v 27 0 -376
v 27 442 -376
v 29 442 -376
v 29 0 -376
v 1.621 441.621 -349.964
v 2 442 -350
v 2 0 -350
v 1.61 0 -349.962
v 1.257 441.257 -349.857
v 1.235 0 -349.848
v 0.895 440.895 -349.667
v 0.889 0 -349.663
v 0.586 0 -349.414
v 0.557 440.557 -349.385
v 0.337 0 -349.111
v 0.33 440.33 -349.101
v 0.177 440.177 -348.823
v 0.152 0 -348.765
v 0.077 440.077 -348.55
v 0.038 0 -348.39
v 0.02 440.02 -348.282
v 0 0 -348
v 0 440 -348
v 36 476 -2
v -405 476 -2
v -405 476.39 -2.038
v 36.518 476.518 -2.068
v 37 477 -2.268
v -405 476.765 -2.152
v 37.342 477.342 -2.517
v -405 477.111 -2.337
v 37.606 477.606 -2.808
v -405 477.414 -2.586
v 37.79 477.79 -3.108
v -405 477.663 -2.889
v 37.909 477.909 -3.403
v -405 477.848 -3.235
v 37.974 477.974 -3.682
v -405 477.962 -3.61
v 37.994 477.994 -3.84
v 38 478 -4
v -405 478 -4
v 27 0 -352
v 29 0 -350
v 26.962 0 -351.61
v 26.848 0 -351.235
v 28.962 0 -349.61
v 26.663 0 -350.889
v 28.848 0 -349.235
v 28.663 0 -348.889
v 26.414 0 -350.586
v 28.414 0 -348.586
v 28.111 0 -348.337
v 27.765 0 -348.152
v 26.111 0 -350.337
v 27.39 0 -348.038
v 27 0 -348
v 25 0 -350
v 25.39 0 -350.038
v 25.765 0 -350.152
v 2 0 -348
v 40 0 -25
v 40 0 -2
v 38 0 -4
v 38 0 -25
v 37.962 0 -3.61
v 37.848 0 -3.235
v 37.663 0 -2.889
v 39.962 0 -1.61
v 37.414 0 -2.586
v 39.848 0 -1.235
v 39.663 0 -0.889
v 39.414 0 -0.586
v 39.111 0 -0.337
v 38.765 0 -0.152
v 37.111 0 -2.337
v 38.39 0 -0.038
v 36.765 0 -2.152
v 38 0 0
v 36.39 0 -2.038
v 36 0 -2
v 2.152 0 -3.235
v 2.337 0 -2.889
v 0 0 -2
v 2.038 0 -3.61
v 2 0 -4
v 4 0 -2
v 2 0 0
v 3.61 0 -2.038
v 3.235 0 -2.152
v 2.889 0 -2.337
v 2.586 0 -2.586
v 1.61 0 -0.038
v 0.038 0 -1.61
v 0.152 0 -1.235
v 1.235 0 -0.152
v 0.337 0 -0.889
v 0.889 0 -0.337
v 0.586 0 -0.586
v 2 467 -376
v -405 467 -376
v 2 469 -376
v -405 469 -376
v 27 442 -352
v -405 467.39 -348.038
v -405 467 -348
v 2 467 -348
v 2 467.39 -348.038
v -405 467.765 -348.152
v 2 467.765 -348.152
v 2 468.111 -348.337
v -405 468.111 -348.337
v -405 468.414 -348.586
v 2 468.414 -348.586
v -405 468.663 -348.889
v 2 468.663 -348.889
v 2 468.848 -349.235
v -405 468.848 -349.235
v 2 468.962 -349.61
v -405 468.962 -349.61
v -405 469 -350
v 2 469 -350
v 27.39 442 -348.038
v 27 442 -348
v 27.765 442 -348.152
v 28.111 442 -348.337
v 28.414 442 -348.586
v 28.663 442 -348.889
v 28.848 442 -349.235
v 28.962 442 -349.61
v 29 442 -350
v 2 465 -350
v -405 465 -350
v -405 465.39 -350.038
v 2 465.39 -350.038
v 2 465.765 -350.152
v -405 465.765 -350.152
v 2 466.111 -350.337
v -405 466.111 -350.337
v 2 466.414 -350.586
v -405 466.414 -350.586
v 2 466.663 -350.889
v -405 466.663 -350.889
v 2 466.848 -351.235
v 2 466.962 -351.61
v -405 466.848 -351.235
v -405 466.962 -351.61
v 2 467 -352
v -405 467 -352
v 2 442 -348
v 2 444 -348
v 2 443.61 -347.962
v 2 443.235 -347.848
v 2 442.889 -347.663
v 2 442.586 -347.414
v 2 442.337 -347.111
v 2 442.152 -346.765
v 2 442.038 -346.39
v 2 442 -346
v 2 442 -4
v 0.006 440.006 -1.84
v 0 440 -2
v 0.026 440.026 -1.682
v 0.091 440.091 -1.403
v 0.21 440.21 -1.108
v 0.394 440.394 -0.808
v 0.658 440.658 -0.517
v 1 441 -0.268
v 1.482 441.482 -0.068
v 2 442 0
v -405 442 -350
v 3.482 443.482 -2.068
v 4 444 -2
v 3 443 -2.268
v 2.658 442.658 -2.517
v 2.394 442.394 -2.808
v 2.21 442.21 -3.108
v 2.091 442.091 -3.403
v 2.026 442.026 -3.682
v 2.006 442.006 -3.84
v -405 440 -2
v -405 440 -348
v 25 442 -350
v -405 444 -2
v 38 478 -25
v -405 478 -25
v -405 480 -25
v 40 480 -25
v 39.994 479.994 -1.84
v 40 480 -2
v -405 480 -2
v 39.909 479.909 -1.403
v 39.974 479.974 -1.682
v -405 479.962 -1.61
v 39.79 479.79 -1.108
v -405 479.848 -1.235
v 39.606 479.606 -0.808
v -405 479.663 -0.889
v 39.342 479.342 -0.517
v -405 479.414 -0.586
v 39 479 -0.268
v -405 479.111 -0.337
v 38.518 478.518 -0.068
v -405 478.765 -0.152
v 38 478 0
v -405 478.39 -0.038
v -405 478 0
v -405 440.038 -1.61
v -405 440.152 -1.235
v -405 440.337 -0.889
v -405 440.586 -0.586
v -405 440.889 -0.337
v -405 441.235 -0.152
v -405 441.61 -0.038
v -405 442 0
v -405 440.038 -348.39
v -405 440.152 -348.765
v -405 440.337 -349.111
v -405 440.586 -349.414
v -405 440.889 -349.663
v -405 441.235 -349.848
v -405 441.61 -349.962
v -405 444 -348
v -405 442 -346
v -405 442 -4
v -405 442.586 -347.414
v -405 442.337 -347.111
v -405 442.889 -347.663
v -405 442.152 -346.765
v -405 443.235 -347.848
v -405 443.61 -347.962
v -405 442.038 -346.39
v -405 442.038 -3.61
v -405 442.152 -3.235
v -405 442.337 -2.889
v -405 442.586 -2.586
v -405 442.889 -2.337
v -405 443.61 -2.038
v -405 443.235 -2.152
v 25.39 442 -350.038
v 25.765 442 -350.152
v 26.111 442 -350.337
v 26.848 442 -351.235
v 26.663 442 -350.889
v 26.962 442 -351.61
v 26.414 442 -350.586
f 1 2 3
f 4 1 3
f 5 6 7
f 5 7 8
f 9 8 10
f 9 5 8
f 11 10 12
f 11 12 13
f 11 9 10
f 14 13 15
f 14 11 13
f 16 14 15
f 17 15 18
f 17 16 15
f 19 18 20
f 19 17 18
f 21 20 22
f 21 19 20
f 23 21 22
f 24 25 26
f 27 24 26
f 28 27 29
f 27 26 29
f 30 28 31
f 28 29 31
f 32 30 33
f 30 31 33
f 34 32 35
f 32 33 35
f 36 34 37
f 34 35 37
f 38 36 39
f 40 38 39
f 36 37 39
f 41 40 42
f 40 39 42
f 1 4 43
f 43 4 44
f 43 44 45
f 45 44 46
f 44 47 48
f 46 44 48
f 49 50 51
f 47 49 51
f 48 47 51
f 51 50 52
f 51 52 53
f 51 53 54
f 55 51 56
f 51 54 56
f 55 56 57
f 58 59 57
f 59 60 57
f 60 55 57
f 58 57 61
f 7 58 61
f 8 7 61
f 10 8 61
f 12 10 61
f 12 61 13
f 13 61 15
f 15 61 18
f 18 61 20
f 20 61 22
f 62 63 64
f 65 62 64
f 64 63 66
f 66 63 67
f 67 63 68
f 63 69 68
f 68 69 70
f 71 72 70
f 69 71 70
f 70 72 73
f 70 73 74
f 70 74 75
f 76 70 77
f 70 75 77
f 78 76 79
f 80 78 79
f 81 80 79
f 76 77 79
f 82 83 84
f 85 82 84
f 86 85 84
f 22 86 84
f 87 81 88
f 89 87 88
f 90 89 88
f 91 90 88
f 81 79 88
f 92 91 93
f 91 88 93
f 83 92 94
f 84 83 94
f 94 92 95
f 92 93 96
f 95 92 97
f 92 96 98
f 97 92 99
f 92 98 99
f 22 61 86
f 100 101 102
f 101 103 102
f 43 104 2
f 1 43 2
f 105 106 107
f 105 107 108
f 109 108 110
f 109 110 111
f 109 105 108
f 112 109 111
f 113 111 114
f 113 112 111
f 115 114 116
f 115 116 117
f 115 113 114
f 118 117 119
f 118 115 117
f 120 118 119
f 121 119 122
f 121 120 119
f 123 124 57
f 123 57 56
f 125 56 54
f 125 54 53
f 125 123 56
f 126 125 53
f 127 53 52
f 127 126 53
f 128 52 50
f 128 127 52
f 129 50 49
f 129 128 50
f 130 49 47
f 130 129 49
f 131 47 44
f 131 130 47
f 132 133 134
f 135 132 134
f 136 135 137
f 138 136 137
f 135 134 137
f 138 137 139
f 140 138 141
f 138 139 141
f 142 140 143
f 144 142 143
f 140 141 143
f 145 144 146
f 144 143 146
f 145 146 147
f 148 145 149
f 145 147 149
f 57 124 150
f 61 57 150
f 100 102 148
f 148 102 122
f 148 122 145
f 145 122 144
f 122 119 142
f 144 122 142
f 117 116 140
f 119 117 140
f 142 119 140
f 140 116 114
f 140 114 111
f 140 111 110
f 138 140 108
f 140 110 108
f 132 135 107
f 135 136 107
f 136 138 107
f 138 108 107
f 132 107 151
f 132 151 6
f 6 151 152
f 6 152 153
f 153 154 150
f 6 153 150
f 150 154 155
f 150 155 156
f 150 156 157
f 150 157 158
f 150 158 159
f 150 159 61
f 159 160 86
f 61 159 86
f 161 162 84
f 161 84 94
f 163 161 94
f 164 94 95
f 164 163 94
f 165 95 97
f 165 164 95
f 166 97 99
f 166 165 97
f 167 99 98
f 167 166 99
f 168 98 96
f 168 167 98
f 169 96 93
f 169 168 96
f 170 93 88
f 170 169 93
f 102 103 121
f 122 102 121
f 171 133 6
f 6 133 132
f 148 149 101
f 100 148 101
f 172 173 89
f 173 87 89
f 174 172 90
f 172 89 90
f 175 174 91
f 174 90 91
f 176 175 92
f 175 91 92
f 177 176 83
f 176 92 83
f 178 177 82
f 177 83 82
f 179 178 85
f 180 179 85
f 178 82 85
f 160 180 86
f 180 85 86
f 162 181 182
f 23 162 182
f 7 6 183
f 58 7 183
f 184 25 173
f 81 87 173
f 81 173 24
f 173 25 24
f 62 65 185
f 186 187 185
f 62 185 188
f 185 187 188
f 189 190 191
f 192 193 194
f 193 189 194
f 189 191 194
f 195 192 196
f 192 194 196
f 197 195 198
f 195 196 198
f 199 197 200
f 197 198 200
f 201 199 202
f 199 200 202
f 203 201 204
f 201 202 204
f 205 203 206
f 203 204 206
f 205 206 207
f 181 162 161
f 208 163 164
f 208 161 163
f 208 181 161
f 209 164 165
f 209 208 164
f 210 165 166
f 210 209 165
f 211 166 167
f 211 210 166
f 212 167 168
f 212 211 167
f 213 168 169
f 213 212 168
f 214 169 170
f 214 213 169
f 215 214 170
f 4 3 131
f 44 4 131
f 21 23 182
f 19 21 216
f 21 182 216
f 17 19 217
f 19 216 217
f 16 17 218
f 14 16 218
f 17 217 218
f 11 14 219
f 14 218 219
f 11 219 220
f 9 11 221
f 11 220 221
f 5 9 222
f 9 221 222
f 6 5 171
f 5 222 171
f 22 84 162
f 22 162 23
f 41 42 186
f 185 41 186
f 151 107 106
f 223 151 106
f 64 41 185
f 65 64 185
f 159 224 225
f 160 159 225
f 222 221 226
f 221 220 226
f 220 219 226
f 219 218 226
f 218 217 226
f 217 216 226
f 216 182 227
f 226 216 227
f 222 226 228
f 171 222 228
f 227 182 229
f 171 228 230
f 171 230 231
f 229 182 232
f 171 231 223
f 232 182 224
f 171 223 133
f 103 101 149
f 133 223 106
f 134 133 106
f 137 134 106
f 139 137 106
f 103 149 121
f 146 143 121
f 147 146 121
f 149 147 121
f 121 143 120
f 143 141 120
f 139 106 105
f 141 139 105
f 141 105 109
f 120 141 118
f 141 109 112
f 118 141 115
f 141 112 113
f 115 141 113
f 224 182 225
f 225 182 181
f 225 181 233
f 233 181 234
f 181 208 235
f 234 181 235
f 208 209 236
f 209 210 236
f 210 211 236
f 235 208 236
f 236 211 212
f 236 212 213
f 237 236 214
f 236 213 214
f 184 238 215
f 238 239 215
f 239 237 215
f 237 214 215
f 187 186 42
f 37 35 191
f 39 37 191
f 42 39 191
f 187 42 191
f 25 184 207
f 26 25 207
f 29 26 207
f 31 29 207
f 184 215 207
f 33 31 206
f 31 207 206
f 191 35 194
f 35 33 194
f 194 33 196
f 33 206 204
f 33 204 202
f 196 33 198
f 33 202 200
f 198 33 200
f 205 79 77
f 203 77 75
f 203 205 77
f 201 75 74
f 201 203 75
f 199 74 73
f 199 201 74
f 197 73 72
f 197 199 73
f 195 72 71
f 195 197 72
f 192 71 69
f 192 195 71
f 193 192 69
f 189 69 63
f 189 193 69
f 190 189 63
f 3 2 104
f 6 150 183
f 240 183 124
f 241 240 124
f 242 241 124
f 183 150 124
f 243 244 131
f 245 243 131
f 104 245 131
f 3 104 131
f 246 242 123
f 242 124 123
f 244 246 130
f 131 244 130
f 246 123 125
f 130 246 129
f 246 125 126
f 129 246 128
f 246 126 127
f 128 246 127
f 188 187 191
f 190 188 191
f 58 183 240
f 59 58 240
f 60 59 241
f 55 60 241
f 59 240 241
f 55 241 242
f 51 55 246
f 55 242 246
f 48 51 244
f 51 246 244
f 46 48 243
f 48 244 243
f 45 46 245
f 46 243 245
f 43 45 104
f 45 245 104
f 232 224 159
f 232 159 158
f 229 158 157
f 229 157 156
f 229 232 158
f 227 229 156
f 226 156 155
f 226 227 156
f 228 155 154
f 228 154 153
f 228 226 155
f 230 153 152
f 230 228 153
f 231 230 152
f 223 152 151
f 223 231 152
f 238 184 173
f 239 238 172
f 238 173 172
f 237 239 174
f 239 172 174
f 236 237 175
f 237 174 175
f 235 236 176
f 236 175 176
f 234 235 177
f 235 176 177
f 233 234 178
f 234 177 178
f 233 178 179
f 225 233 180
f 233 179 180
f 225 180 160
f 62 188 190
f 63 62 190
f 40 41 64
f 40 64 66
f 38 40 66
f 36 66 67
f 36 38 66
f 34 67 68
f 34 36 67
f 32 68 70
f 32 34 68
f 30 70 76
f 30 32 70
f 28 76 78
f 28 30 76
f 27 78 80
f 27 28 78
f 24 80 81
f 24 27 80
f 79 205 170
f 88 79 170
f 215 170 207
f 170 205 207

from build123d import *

# Parameters (mm, degrees)
F3_W         = 27
F3_H         = 27
F4_DEPTH     = 30
F5_T1_DEPTH  = 407
F5_T3_DEPTH  = 443
F5_T5_DEPTH  = 442
F5_T7_DEPTH  = 478
F5_T13_DEPTH = 447
F5_T17_DEPTH = 412
F5_T20_DEPTH = 417
F5_T22_DEPTH = 455
F5_T24_DEPTH = 410
F5_T26_DEPTH = 445
F5_T28_DEPTH = 490
F5_T30_DEPTH = 452
F5_T36_DEPTH = 415
F5_T40_DEPTH = 450
F5_T47_DEPTH = 415
F5_T51_DEPTH = 450


# Not quite as in the source:
# - a fillet or chamfer that OpenCascade refuses, or shapes differently, is made with other operations: its cross-section is extruded or revolved along the edge and cut away or added


with BuildPart() as f2:
    # F2: sweep along a path in F1
    with BuildLine(Plane.XY) as f2_path:
        Line((0, 0), (0, 440))
        Line((0, 440), (-405, 440))
    # F0 (on Front) → F2 (sweep)
    with BuildSketch(Plane.XZ):
        Polygon((38, -2), (38, -25), (40, -25), (40, 0), (0, 0), (0, -350), (27, -350), (27, -376), (29, -376), (29, -348), (2, -348), (2, -2), align=None)
    sweep(path=f2_path.line, transition=Transition.RIGHT)

    # F3 (on face) → F4 (cut)
    with BuildSketch(Plane.XY.offset(-348)):
        with Locations((15.5, 455.5)):
            Rectangle(F3_W, F3_H)
    extrude(amount=-F4_DEPTH, mode=Mode.SUBTRACT)

    # F5: fillet of radius 2 on 15 edges, made by hand

    # F5_s2 → F5_t1 (join)
    with BuildSketch(Plane.YZ.offset(-405)):
        with BuildLine():
            ThreePointArc((442, -346), (442.5857864376, -347.4142135624), (444, -348))
            Line((444, -348), (442, -348))
            Line((442, -348), (442, -346))
        make_face()
        with BuildLine():
            ThreePointArc((465, -350), (466.4142135624, -350.5857864376), (467, -352))
            Line((467, -352), (467, -350))
            Line((467, -350), (465, -350))
        make_face()
        with BuildLine():
            ThreePointArc((444, -2), (442.5857864376, -2.5857864376), (442, -4))
            Line((442, -4), (442, -2))
            Line((442, -2), (444, -2))
        make_face()
    extrude(amount=F5_T1_DEPTH)

    # F5_s4 → F5_t3 (join)
    with BuildSketch(Plane.YZ.offset(-405)):
        with BuildLine():
            ThreePointArc((476, -2), (477.4142135624, -2.5857864376), (478, -4))
            Line((478, -4), (478, -2))
            Line((478, -2), (476, -2))
        make_face()
    extrude(amount=F5_T3_DEPTH)

    # F5_s6 → F5_t5 (join)
    with BuildSketch(Plane.XZ.offset(-442)):
        with BuildLine():
            ThreePointArc((25, -350), (26.4142135624, -350.5857864376), (27, -352))
            Line((27, -352), (27, -350))
            Line((27, -350), (25, -350))
        make_face()
        with BuildLine():
            ThreePointArc((4, -2), (2.5857864376, -2.5857864376), (2, -4))
            Line((2, -4), (2, -2))
            Line((2, -2), (4, -2))
        make_face()
    extrude(amount=F5_T5_DEPTH)

    # F5_s8 → F5_t7 (join)
    with BuildSketch(Plane.XZ.offset(-478)):
        with BuildLine():
            ThreePointArc((38, -4), (37.4142135624, -2.5857864376), (36, -2))
            Line((36, -2), (38, -2))
            Line((38, -2), (38, -4))
        make_face()
    extrude(amount=F5_T7_DEPTH)


with BuildPart() as f5_tool11:
    # F5_s12 → F5_t13 (new body)
    with BuildSketch(Plane.XZ):
        with BuildLine():
            ThreePointArc((4, -2), (2.5857864376, -2.5857864376), (2, -4))
            Line((2, -4), (2, -2))
            Line((2, -2), (4, -2))
        make_face()
    extrude(amount=-F5_T13_DEPTH)

    split(bisect_by=Plane.XZ.offset(-442), keep=Keep.BOTTOM)


with BuildPart() as f5_tool15:
    # F5_s16 → F5_t17 (new body)
    with BuildSketch(Plane.YZ.offset(7)):
        with BuildLine():
            ThreePointArc((444, -2), (442.5857864376, -2.5857864376), (442, -4))
            Line((442, -4), (442, -2))
            Line((442, -2), (444, -2))
        make_face()
    extrude(amount=-F5_T17_DEPTH)

    split(bisect_by=Plane.YZ.offset(2), keep=Keep.TOP)


with BuildPart() as f5_tool11_1:
    add(f5_tool11.part)

    # F5_t19: intersect F5_tool15
    add(f5_tool15.part, mode=Mode.INTERSECT)


with BuildPart() as f2_1:
    add(f2.part)

    # F5_t9: union F5_tool11
    add(f5_tool11_1.part)

    # F5_s21 → F5_t20 (cut)
    with BuildSketch(Plane.YZ.offset(-410)):
        with BuildLine():
            ThreePointArc((467, -348), (468.4142135624, -348.5857864376), (469, -350))
            Line((469, -350), (469, -348))
            Line((469, -348), (467, -348))
        make_face()
    extrude(amount=F5_T20_DEPTH, mode=Mode.SUBTRACT)

    # F5_s23 → F5_t22 (cut)
    with BuildSketch(Plane.YZ.offset(-410)):
        with BuildLine():
            ThreePointArc((480, -2), (479.4142135624, -0.5857864376), (478, 0))
            Line((478, 0), (480, 0))
            Line((480, 0), (480, -2))
        make_face()
    extrude(amount=F5_T22_DEPTH, mode=Mode.SUBTRACT)

    # F5_s25 → F5_t24 (cut)
    with BuildSketch(Plane.YZ.offset(-410)):
        with BuildLine():
            ThreePointArc((440, -2), (440.5857864376, -0.5857864376), (442, 0))
            Line((442, 0), (440, 0))
            Line((440, 0), (440, -2))
        make_face()
        with BuildLine():
            ThreePointArc((440, -348), (440.5857864376, -349.4142135624), (442, -350))
            Line((442, -350), (440, -350))
            Line((440, -350), (440, -348))
        make_face()
    extrude(amount=F5_T24_DEPTH, mode=Mode.SUBTRACT)

    # F5_s27 → F5_t26 (cut)
    with BuildSketch(Plane.XZ.offset(-440)):
        with BuildLine():
            ThreePointArc((0, -2), (0.5857864376, -0.5857864376), (2, 0))
            Line((2, 0), (0, 0))
            Line((0, 0), (0, -2))
        make_face()
        with BuildLine():
            ThreePointArc((2, -350), (0.5857864376, -349.4142135624), (0, -348))
            Line((0, -348), (0, -350))
            Line((0, -350), (2, -350))
        make_face()
    extrude(amount=F5_T26_DEPTH, mode=Mode.SUBTRACT)

    # F5_s29 → F5_t28 (cut)
    with BuildSketch(Plane.XZ.offset(-485)):
        with BuildLine():
            ThreePointArc((38, 0), (39.4142135624, -0.5857864376), (40, -2))
            Line((40, -2), (40, 0))
            Line((40, 0), (38, 0))
        make_face()
    extrude(amount=F5_T28_DEPTH, mode=Mode.SUBTRACT)

    # F5_s31 → F5_t30 (cut)
    with BuildSketch(Plane.XZ.offset(-447)):
        with BuildLine():
            ThreePointArc((27, -348), (28.4142135624, -348.5857864376), (29, -350))
            Line((29, -350), (29, -348))
            Line((29, -348), (27, -348))
        make_face()
    extrude(amount=F5_T30_DEPTH, mode=Mode.SUBTRACT)


with BuildPart() as f5_tool34:
    # F5_s35 → F5_t36 (new body)
    with BuildSketch(Plane.YZ.offset(5)):
        with BuildLine():
            ThreePointArc((440, -2), (440.5857864376, -0.5857864376), (442, 0))
            Line((442, 0), (440, 0))
            Line((440, 0), (440, -2))
        make_face()
    extrude(amount=-F5_T36_DEPTH)

    split(bisect_by=Plane.YZ, keep=Keep.TOP)


with BuildPart() as f5_tool38:
    # F5_s39 → F5_t40 (new body)
    with BuildSketch(Plane.XZ.offset(5)):
        with BuildLine():
            ThreePointArc((0, -2), (0.5857864376, -0.5857864376), (2, 0))
            Line((2, 0), (0, 0))
            Line((0, 0), (0, -2))
        make_face()
    extrude(amount=-F5_T40_DEPTH)

    split(bisect_by=Plane.XZ.offset(-440), keep=Keep.BOTTOM)


with BuildPart() as f5_tool34_1:
    add(f5_tool34.part)

    # F5_t42: intersect F5_tool38
    add(f5_tool38.part, mode=Mode.INTERSECT)


with BuildPart() as f2_2:
    add(f2_1.part)

    # F5_t32: cut F5_tool34
    add(f5_tool34_1.part, mode=Mode.SUBTRACT)


with BuildPart() as f5_tool45:
    # F5_s46 → F5_t47 (new body)
    with BuildSketch(Plane.YZ.offset(5)):
        with BuildLine():
            ThreePointArc((440, -348), (440.5857864376, -349.4142135624), (442, -350))
            Line((442, -350), (440, -350))
            Line((440, -350), (440, -348))
        make_face()
    extrude(amount=-F5_T47_DEPTH)

    split(bisect_by=Plane.YZ, keep=Keep.TOP)


with BuildPart() as f5_tool49:
    # F5_s50 → F5_t51 (new body)
    with BuildSketch(Plane.XZ.offset(5)):
        with BuildLine():
            ThreePointArc((2, -350), (0.5857864376, -349.4142135624), (0, -348))
            Line((0, -348), (0, -350))
            Line((0, -350), (2, -350))
        make_face()
    extrude(amount=-F5_T51_DEPTH)

    split(bisect_by=Plane.XZ.offset(-440), keep=Keep.BOTTOM)


with BuildPart() as f5_tool45_1:
    add(f5_tool45.part)

    # F5_t53: intersect F5_tool49
    add(f5_tool49.part, mode=Mode.INTERSECT)


with BuildPart() as f2_3:
    add(f2_2.part)

    # F5_t43: cut F5_tool45
    add(f5_tool45_1.part, mode=Mode.SUBTRACT)


solid = f2_3.part
